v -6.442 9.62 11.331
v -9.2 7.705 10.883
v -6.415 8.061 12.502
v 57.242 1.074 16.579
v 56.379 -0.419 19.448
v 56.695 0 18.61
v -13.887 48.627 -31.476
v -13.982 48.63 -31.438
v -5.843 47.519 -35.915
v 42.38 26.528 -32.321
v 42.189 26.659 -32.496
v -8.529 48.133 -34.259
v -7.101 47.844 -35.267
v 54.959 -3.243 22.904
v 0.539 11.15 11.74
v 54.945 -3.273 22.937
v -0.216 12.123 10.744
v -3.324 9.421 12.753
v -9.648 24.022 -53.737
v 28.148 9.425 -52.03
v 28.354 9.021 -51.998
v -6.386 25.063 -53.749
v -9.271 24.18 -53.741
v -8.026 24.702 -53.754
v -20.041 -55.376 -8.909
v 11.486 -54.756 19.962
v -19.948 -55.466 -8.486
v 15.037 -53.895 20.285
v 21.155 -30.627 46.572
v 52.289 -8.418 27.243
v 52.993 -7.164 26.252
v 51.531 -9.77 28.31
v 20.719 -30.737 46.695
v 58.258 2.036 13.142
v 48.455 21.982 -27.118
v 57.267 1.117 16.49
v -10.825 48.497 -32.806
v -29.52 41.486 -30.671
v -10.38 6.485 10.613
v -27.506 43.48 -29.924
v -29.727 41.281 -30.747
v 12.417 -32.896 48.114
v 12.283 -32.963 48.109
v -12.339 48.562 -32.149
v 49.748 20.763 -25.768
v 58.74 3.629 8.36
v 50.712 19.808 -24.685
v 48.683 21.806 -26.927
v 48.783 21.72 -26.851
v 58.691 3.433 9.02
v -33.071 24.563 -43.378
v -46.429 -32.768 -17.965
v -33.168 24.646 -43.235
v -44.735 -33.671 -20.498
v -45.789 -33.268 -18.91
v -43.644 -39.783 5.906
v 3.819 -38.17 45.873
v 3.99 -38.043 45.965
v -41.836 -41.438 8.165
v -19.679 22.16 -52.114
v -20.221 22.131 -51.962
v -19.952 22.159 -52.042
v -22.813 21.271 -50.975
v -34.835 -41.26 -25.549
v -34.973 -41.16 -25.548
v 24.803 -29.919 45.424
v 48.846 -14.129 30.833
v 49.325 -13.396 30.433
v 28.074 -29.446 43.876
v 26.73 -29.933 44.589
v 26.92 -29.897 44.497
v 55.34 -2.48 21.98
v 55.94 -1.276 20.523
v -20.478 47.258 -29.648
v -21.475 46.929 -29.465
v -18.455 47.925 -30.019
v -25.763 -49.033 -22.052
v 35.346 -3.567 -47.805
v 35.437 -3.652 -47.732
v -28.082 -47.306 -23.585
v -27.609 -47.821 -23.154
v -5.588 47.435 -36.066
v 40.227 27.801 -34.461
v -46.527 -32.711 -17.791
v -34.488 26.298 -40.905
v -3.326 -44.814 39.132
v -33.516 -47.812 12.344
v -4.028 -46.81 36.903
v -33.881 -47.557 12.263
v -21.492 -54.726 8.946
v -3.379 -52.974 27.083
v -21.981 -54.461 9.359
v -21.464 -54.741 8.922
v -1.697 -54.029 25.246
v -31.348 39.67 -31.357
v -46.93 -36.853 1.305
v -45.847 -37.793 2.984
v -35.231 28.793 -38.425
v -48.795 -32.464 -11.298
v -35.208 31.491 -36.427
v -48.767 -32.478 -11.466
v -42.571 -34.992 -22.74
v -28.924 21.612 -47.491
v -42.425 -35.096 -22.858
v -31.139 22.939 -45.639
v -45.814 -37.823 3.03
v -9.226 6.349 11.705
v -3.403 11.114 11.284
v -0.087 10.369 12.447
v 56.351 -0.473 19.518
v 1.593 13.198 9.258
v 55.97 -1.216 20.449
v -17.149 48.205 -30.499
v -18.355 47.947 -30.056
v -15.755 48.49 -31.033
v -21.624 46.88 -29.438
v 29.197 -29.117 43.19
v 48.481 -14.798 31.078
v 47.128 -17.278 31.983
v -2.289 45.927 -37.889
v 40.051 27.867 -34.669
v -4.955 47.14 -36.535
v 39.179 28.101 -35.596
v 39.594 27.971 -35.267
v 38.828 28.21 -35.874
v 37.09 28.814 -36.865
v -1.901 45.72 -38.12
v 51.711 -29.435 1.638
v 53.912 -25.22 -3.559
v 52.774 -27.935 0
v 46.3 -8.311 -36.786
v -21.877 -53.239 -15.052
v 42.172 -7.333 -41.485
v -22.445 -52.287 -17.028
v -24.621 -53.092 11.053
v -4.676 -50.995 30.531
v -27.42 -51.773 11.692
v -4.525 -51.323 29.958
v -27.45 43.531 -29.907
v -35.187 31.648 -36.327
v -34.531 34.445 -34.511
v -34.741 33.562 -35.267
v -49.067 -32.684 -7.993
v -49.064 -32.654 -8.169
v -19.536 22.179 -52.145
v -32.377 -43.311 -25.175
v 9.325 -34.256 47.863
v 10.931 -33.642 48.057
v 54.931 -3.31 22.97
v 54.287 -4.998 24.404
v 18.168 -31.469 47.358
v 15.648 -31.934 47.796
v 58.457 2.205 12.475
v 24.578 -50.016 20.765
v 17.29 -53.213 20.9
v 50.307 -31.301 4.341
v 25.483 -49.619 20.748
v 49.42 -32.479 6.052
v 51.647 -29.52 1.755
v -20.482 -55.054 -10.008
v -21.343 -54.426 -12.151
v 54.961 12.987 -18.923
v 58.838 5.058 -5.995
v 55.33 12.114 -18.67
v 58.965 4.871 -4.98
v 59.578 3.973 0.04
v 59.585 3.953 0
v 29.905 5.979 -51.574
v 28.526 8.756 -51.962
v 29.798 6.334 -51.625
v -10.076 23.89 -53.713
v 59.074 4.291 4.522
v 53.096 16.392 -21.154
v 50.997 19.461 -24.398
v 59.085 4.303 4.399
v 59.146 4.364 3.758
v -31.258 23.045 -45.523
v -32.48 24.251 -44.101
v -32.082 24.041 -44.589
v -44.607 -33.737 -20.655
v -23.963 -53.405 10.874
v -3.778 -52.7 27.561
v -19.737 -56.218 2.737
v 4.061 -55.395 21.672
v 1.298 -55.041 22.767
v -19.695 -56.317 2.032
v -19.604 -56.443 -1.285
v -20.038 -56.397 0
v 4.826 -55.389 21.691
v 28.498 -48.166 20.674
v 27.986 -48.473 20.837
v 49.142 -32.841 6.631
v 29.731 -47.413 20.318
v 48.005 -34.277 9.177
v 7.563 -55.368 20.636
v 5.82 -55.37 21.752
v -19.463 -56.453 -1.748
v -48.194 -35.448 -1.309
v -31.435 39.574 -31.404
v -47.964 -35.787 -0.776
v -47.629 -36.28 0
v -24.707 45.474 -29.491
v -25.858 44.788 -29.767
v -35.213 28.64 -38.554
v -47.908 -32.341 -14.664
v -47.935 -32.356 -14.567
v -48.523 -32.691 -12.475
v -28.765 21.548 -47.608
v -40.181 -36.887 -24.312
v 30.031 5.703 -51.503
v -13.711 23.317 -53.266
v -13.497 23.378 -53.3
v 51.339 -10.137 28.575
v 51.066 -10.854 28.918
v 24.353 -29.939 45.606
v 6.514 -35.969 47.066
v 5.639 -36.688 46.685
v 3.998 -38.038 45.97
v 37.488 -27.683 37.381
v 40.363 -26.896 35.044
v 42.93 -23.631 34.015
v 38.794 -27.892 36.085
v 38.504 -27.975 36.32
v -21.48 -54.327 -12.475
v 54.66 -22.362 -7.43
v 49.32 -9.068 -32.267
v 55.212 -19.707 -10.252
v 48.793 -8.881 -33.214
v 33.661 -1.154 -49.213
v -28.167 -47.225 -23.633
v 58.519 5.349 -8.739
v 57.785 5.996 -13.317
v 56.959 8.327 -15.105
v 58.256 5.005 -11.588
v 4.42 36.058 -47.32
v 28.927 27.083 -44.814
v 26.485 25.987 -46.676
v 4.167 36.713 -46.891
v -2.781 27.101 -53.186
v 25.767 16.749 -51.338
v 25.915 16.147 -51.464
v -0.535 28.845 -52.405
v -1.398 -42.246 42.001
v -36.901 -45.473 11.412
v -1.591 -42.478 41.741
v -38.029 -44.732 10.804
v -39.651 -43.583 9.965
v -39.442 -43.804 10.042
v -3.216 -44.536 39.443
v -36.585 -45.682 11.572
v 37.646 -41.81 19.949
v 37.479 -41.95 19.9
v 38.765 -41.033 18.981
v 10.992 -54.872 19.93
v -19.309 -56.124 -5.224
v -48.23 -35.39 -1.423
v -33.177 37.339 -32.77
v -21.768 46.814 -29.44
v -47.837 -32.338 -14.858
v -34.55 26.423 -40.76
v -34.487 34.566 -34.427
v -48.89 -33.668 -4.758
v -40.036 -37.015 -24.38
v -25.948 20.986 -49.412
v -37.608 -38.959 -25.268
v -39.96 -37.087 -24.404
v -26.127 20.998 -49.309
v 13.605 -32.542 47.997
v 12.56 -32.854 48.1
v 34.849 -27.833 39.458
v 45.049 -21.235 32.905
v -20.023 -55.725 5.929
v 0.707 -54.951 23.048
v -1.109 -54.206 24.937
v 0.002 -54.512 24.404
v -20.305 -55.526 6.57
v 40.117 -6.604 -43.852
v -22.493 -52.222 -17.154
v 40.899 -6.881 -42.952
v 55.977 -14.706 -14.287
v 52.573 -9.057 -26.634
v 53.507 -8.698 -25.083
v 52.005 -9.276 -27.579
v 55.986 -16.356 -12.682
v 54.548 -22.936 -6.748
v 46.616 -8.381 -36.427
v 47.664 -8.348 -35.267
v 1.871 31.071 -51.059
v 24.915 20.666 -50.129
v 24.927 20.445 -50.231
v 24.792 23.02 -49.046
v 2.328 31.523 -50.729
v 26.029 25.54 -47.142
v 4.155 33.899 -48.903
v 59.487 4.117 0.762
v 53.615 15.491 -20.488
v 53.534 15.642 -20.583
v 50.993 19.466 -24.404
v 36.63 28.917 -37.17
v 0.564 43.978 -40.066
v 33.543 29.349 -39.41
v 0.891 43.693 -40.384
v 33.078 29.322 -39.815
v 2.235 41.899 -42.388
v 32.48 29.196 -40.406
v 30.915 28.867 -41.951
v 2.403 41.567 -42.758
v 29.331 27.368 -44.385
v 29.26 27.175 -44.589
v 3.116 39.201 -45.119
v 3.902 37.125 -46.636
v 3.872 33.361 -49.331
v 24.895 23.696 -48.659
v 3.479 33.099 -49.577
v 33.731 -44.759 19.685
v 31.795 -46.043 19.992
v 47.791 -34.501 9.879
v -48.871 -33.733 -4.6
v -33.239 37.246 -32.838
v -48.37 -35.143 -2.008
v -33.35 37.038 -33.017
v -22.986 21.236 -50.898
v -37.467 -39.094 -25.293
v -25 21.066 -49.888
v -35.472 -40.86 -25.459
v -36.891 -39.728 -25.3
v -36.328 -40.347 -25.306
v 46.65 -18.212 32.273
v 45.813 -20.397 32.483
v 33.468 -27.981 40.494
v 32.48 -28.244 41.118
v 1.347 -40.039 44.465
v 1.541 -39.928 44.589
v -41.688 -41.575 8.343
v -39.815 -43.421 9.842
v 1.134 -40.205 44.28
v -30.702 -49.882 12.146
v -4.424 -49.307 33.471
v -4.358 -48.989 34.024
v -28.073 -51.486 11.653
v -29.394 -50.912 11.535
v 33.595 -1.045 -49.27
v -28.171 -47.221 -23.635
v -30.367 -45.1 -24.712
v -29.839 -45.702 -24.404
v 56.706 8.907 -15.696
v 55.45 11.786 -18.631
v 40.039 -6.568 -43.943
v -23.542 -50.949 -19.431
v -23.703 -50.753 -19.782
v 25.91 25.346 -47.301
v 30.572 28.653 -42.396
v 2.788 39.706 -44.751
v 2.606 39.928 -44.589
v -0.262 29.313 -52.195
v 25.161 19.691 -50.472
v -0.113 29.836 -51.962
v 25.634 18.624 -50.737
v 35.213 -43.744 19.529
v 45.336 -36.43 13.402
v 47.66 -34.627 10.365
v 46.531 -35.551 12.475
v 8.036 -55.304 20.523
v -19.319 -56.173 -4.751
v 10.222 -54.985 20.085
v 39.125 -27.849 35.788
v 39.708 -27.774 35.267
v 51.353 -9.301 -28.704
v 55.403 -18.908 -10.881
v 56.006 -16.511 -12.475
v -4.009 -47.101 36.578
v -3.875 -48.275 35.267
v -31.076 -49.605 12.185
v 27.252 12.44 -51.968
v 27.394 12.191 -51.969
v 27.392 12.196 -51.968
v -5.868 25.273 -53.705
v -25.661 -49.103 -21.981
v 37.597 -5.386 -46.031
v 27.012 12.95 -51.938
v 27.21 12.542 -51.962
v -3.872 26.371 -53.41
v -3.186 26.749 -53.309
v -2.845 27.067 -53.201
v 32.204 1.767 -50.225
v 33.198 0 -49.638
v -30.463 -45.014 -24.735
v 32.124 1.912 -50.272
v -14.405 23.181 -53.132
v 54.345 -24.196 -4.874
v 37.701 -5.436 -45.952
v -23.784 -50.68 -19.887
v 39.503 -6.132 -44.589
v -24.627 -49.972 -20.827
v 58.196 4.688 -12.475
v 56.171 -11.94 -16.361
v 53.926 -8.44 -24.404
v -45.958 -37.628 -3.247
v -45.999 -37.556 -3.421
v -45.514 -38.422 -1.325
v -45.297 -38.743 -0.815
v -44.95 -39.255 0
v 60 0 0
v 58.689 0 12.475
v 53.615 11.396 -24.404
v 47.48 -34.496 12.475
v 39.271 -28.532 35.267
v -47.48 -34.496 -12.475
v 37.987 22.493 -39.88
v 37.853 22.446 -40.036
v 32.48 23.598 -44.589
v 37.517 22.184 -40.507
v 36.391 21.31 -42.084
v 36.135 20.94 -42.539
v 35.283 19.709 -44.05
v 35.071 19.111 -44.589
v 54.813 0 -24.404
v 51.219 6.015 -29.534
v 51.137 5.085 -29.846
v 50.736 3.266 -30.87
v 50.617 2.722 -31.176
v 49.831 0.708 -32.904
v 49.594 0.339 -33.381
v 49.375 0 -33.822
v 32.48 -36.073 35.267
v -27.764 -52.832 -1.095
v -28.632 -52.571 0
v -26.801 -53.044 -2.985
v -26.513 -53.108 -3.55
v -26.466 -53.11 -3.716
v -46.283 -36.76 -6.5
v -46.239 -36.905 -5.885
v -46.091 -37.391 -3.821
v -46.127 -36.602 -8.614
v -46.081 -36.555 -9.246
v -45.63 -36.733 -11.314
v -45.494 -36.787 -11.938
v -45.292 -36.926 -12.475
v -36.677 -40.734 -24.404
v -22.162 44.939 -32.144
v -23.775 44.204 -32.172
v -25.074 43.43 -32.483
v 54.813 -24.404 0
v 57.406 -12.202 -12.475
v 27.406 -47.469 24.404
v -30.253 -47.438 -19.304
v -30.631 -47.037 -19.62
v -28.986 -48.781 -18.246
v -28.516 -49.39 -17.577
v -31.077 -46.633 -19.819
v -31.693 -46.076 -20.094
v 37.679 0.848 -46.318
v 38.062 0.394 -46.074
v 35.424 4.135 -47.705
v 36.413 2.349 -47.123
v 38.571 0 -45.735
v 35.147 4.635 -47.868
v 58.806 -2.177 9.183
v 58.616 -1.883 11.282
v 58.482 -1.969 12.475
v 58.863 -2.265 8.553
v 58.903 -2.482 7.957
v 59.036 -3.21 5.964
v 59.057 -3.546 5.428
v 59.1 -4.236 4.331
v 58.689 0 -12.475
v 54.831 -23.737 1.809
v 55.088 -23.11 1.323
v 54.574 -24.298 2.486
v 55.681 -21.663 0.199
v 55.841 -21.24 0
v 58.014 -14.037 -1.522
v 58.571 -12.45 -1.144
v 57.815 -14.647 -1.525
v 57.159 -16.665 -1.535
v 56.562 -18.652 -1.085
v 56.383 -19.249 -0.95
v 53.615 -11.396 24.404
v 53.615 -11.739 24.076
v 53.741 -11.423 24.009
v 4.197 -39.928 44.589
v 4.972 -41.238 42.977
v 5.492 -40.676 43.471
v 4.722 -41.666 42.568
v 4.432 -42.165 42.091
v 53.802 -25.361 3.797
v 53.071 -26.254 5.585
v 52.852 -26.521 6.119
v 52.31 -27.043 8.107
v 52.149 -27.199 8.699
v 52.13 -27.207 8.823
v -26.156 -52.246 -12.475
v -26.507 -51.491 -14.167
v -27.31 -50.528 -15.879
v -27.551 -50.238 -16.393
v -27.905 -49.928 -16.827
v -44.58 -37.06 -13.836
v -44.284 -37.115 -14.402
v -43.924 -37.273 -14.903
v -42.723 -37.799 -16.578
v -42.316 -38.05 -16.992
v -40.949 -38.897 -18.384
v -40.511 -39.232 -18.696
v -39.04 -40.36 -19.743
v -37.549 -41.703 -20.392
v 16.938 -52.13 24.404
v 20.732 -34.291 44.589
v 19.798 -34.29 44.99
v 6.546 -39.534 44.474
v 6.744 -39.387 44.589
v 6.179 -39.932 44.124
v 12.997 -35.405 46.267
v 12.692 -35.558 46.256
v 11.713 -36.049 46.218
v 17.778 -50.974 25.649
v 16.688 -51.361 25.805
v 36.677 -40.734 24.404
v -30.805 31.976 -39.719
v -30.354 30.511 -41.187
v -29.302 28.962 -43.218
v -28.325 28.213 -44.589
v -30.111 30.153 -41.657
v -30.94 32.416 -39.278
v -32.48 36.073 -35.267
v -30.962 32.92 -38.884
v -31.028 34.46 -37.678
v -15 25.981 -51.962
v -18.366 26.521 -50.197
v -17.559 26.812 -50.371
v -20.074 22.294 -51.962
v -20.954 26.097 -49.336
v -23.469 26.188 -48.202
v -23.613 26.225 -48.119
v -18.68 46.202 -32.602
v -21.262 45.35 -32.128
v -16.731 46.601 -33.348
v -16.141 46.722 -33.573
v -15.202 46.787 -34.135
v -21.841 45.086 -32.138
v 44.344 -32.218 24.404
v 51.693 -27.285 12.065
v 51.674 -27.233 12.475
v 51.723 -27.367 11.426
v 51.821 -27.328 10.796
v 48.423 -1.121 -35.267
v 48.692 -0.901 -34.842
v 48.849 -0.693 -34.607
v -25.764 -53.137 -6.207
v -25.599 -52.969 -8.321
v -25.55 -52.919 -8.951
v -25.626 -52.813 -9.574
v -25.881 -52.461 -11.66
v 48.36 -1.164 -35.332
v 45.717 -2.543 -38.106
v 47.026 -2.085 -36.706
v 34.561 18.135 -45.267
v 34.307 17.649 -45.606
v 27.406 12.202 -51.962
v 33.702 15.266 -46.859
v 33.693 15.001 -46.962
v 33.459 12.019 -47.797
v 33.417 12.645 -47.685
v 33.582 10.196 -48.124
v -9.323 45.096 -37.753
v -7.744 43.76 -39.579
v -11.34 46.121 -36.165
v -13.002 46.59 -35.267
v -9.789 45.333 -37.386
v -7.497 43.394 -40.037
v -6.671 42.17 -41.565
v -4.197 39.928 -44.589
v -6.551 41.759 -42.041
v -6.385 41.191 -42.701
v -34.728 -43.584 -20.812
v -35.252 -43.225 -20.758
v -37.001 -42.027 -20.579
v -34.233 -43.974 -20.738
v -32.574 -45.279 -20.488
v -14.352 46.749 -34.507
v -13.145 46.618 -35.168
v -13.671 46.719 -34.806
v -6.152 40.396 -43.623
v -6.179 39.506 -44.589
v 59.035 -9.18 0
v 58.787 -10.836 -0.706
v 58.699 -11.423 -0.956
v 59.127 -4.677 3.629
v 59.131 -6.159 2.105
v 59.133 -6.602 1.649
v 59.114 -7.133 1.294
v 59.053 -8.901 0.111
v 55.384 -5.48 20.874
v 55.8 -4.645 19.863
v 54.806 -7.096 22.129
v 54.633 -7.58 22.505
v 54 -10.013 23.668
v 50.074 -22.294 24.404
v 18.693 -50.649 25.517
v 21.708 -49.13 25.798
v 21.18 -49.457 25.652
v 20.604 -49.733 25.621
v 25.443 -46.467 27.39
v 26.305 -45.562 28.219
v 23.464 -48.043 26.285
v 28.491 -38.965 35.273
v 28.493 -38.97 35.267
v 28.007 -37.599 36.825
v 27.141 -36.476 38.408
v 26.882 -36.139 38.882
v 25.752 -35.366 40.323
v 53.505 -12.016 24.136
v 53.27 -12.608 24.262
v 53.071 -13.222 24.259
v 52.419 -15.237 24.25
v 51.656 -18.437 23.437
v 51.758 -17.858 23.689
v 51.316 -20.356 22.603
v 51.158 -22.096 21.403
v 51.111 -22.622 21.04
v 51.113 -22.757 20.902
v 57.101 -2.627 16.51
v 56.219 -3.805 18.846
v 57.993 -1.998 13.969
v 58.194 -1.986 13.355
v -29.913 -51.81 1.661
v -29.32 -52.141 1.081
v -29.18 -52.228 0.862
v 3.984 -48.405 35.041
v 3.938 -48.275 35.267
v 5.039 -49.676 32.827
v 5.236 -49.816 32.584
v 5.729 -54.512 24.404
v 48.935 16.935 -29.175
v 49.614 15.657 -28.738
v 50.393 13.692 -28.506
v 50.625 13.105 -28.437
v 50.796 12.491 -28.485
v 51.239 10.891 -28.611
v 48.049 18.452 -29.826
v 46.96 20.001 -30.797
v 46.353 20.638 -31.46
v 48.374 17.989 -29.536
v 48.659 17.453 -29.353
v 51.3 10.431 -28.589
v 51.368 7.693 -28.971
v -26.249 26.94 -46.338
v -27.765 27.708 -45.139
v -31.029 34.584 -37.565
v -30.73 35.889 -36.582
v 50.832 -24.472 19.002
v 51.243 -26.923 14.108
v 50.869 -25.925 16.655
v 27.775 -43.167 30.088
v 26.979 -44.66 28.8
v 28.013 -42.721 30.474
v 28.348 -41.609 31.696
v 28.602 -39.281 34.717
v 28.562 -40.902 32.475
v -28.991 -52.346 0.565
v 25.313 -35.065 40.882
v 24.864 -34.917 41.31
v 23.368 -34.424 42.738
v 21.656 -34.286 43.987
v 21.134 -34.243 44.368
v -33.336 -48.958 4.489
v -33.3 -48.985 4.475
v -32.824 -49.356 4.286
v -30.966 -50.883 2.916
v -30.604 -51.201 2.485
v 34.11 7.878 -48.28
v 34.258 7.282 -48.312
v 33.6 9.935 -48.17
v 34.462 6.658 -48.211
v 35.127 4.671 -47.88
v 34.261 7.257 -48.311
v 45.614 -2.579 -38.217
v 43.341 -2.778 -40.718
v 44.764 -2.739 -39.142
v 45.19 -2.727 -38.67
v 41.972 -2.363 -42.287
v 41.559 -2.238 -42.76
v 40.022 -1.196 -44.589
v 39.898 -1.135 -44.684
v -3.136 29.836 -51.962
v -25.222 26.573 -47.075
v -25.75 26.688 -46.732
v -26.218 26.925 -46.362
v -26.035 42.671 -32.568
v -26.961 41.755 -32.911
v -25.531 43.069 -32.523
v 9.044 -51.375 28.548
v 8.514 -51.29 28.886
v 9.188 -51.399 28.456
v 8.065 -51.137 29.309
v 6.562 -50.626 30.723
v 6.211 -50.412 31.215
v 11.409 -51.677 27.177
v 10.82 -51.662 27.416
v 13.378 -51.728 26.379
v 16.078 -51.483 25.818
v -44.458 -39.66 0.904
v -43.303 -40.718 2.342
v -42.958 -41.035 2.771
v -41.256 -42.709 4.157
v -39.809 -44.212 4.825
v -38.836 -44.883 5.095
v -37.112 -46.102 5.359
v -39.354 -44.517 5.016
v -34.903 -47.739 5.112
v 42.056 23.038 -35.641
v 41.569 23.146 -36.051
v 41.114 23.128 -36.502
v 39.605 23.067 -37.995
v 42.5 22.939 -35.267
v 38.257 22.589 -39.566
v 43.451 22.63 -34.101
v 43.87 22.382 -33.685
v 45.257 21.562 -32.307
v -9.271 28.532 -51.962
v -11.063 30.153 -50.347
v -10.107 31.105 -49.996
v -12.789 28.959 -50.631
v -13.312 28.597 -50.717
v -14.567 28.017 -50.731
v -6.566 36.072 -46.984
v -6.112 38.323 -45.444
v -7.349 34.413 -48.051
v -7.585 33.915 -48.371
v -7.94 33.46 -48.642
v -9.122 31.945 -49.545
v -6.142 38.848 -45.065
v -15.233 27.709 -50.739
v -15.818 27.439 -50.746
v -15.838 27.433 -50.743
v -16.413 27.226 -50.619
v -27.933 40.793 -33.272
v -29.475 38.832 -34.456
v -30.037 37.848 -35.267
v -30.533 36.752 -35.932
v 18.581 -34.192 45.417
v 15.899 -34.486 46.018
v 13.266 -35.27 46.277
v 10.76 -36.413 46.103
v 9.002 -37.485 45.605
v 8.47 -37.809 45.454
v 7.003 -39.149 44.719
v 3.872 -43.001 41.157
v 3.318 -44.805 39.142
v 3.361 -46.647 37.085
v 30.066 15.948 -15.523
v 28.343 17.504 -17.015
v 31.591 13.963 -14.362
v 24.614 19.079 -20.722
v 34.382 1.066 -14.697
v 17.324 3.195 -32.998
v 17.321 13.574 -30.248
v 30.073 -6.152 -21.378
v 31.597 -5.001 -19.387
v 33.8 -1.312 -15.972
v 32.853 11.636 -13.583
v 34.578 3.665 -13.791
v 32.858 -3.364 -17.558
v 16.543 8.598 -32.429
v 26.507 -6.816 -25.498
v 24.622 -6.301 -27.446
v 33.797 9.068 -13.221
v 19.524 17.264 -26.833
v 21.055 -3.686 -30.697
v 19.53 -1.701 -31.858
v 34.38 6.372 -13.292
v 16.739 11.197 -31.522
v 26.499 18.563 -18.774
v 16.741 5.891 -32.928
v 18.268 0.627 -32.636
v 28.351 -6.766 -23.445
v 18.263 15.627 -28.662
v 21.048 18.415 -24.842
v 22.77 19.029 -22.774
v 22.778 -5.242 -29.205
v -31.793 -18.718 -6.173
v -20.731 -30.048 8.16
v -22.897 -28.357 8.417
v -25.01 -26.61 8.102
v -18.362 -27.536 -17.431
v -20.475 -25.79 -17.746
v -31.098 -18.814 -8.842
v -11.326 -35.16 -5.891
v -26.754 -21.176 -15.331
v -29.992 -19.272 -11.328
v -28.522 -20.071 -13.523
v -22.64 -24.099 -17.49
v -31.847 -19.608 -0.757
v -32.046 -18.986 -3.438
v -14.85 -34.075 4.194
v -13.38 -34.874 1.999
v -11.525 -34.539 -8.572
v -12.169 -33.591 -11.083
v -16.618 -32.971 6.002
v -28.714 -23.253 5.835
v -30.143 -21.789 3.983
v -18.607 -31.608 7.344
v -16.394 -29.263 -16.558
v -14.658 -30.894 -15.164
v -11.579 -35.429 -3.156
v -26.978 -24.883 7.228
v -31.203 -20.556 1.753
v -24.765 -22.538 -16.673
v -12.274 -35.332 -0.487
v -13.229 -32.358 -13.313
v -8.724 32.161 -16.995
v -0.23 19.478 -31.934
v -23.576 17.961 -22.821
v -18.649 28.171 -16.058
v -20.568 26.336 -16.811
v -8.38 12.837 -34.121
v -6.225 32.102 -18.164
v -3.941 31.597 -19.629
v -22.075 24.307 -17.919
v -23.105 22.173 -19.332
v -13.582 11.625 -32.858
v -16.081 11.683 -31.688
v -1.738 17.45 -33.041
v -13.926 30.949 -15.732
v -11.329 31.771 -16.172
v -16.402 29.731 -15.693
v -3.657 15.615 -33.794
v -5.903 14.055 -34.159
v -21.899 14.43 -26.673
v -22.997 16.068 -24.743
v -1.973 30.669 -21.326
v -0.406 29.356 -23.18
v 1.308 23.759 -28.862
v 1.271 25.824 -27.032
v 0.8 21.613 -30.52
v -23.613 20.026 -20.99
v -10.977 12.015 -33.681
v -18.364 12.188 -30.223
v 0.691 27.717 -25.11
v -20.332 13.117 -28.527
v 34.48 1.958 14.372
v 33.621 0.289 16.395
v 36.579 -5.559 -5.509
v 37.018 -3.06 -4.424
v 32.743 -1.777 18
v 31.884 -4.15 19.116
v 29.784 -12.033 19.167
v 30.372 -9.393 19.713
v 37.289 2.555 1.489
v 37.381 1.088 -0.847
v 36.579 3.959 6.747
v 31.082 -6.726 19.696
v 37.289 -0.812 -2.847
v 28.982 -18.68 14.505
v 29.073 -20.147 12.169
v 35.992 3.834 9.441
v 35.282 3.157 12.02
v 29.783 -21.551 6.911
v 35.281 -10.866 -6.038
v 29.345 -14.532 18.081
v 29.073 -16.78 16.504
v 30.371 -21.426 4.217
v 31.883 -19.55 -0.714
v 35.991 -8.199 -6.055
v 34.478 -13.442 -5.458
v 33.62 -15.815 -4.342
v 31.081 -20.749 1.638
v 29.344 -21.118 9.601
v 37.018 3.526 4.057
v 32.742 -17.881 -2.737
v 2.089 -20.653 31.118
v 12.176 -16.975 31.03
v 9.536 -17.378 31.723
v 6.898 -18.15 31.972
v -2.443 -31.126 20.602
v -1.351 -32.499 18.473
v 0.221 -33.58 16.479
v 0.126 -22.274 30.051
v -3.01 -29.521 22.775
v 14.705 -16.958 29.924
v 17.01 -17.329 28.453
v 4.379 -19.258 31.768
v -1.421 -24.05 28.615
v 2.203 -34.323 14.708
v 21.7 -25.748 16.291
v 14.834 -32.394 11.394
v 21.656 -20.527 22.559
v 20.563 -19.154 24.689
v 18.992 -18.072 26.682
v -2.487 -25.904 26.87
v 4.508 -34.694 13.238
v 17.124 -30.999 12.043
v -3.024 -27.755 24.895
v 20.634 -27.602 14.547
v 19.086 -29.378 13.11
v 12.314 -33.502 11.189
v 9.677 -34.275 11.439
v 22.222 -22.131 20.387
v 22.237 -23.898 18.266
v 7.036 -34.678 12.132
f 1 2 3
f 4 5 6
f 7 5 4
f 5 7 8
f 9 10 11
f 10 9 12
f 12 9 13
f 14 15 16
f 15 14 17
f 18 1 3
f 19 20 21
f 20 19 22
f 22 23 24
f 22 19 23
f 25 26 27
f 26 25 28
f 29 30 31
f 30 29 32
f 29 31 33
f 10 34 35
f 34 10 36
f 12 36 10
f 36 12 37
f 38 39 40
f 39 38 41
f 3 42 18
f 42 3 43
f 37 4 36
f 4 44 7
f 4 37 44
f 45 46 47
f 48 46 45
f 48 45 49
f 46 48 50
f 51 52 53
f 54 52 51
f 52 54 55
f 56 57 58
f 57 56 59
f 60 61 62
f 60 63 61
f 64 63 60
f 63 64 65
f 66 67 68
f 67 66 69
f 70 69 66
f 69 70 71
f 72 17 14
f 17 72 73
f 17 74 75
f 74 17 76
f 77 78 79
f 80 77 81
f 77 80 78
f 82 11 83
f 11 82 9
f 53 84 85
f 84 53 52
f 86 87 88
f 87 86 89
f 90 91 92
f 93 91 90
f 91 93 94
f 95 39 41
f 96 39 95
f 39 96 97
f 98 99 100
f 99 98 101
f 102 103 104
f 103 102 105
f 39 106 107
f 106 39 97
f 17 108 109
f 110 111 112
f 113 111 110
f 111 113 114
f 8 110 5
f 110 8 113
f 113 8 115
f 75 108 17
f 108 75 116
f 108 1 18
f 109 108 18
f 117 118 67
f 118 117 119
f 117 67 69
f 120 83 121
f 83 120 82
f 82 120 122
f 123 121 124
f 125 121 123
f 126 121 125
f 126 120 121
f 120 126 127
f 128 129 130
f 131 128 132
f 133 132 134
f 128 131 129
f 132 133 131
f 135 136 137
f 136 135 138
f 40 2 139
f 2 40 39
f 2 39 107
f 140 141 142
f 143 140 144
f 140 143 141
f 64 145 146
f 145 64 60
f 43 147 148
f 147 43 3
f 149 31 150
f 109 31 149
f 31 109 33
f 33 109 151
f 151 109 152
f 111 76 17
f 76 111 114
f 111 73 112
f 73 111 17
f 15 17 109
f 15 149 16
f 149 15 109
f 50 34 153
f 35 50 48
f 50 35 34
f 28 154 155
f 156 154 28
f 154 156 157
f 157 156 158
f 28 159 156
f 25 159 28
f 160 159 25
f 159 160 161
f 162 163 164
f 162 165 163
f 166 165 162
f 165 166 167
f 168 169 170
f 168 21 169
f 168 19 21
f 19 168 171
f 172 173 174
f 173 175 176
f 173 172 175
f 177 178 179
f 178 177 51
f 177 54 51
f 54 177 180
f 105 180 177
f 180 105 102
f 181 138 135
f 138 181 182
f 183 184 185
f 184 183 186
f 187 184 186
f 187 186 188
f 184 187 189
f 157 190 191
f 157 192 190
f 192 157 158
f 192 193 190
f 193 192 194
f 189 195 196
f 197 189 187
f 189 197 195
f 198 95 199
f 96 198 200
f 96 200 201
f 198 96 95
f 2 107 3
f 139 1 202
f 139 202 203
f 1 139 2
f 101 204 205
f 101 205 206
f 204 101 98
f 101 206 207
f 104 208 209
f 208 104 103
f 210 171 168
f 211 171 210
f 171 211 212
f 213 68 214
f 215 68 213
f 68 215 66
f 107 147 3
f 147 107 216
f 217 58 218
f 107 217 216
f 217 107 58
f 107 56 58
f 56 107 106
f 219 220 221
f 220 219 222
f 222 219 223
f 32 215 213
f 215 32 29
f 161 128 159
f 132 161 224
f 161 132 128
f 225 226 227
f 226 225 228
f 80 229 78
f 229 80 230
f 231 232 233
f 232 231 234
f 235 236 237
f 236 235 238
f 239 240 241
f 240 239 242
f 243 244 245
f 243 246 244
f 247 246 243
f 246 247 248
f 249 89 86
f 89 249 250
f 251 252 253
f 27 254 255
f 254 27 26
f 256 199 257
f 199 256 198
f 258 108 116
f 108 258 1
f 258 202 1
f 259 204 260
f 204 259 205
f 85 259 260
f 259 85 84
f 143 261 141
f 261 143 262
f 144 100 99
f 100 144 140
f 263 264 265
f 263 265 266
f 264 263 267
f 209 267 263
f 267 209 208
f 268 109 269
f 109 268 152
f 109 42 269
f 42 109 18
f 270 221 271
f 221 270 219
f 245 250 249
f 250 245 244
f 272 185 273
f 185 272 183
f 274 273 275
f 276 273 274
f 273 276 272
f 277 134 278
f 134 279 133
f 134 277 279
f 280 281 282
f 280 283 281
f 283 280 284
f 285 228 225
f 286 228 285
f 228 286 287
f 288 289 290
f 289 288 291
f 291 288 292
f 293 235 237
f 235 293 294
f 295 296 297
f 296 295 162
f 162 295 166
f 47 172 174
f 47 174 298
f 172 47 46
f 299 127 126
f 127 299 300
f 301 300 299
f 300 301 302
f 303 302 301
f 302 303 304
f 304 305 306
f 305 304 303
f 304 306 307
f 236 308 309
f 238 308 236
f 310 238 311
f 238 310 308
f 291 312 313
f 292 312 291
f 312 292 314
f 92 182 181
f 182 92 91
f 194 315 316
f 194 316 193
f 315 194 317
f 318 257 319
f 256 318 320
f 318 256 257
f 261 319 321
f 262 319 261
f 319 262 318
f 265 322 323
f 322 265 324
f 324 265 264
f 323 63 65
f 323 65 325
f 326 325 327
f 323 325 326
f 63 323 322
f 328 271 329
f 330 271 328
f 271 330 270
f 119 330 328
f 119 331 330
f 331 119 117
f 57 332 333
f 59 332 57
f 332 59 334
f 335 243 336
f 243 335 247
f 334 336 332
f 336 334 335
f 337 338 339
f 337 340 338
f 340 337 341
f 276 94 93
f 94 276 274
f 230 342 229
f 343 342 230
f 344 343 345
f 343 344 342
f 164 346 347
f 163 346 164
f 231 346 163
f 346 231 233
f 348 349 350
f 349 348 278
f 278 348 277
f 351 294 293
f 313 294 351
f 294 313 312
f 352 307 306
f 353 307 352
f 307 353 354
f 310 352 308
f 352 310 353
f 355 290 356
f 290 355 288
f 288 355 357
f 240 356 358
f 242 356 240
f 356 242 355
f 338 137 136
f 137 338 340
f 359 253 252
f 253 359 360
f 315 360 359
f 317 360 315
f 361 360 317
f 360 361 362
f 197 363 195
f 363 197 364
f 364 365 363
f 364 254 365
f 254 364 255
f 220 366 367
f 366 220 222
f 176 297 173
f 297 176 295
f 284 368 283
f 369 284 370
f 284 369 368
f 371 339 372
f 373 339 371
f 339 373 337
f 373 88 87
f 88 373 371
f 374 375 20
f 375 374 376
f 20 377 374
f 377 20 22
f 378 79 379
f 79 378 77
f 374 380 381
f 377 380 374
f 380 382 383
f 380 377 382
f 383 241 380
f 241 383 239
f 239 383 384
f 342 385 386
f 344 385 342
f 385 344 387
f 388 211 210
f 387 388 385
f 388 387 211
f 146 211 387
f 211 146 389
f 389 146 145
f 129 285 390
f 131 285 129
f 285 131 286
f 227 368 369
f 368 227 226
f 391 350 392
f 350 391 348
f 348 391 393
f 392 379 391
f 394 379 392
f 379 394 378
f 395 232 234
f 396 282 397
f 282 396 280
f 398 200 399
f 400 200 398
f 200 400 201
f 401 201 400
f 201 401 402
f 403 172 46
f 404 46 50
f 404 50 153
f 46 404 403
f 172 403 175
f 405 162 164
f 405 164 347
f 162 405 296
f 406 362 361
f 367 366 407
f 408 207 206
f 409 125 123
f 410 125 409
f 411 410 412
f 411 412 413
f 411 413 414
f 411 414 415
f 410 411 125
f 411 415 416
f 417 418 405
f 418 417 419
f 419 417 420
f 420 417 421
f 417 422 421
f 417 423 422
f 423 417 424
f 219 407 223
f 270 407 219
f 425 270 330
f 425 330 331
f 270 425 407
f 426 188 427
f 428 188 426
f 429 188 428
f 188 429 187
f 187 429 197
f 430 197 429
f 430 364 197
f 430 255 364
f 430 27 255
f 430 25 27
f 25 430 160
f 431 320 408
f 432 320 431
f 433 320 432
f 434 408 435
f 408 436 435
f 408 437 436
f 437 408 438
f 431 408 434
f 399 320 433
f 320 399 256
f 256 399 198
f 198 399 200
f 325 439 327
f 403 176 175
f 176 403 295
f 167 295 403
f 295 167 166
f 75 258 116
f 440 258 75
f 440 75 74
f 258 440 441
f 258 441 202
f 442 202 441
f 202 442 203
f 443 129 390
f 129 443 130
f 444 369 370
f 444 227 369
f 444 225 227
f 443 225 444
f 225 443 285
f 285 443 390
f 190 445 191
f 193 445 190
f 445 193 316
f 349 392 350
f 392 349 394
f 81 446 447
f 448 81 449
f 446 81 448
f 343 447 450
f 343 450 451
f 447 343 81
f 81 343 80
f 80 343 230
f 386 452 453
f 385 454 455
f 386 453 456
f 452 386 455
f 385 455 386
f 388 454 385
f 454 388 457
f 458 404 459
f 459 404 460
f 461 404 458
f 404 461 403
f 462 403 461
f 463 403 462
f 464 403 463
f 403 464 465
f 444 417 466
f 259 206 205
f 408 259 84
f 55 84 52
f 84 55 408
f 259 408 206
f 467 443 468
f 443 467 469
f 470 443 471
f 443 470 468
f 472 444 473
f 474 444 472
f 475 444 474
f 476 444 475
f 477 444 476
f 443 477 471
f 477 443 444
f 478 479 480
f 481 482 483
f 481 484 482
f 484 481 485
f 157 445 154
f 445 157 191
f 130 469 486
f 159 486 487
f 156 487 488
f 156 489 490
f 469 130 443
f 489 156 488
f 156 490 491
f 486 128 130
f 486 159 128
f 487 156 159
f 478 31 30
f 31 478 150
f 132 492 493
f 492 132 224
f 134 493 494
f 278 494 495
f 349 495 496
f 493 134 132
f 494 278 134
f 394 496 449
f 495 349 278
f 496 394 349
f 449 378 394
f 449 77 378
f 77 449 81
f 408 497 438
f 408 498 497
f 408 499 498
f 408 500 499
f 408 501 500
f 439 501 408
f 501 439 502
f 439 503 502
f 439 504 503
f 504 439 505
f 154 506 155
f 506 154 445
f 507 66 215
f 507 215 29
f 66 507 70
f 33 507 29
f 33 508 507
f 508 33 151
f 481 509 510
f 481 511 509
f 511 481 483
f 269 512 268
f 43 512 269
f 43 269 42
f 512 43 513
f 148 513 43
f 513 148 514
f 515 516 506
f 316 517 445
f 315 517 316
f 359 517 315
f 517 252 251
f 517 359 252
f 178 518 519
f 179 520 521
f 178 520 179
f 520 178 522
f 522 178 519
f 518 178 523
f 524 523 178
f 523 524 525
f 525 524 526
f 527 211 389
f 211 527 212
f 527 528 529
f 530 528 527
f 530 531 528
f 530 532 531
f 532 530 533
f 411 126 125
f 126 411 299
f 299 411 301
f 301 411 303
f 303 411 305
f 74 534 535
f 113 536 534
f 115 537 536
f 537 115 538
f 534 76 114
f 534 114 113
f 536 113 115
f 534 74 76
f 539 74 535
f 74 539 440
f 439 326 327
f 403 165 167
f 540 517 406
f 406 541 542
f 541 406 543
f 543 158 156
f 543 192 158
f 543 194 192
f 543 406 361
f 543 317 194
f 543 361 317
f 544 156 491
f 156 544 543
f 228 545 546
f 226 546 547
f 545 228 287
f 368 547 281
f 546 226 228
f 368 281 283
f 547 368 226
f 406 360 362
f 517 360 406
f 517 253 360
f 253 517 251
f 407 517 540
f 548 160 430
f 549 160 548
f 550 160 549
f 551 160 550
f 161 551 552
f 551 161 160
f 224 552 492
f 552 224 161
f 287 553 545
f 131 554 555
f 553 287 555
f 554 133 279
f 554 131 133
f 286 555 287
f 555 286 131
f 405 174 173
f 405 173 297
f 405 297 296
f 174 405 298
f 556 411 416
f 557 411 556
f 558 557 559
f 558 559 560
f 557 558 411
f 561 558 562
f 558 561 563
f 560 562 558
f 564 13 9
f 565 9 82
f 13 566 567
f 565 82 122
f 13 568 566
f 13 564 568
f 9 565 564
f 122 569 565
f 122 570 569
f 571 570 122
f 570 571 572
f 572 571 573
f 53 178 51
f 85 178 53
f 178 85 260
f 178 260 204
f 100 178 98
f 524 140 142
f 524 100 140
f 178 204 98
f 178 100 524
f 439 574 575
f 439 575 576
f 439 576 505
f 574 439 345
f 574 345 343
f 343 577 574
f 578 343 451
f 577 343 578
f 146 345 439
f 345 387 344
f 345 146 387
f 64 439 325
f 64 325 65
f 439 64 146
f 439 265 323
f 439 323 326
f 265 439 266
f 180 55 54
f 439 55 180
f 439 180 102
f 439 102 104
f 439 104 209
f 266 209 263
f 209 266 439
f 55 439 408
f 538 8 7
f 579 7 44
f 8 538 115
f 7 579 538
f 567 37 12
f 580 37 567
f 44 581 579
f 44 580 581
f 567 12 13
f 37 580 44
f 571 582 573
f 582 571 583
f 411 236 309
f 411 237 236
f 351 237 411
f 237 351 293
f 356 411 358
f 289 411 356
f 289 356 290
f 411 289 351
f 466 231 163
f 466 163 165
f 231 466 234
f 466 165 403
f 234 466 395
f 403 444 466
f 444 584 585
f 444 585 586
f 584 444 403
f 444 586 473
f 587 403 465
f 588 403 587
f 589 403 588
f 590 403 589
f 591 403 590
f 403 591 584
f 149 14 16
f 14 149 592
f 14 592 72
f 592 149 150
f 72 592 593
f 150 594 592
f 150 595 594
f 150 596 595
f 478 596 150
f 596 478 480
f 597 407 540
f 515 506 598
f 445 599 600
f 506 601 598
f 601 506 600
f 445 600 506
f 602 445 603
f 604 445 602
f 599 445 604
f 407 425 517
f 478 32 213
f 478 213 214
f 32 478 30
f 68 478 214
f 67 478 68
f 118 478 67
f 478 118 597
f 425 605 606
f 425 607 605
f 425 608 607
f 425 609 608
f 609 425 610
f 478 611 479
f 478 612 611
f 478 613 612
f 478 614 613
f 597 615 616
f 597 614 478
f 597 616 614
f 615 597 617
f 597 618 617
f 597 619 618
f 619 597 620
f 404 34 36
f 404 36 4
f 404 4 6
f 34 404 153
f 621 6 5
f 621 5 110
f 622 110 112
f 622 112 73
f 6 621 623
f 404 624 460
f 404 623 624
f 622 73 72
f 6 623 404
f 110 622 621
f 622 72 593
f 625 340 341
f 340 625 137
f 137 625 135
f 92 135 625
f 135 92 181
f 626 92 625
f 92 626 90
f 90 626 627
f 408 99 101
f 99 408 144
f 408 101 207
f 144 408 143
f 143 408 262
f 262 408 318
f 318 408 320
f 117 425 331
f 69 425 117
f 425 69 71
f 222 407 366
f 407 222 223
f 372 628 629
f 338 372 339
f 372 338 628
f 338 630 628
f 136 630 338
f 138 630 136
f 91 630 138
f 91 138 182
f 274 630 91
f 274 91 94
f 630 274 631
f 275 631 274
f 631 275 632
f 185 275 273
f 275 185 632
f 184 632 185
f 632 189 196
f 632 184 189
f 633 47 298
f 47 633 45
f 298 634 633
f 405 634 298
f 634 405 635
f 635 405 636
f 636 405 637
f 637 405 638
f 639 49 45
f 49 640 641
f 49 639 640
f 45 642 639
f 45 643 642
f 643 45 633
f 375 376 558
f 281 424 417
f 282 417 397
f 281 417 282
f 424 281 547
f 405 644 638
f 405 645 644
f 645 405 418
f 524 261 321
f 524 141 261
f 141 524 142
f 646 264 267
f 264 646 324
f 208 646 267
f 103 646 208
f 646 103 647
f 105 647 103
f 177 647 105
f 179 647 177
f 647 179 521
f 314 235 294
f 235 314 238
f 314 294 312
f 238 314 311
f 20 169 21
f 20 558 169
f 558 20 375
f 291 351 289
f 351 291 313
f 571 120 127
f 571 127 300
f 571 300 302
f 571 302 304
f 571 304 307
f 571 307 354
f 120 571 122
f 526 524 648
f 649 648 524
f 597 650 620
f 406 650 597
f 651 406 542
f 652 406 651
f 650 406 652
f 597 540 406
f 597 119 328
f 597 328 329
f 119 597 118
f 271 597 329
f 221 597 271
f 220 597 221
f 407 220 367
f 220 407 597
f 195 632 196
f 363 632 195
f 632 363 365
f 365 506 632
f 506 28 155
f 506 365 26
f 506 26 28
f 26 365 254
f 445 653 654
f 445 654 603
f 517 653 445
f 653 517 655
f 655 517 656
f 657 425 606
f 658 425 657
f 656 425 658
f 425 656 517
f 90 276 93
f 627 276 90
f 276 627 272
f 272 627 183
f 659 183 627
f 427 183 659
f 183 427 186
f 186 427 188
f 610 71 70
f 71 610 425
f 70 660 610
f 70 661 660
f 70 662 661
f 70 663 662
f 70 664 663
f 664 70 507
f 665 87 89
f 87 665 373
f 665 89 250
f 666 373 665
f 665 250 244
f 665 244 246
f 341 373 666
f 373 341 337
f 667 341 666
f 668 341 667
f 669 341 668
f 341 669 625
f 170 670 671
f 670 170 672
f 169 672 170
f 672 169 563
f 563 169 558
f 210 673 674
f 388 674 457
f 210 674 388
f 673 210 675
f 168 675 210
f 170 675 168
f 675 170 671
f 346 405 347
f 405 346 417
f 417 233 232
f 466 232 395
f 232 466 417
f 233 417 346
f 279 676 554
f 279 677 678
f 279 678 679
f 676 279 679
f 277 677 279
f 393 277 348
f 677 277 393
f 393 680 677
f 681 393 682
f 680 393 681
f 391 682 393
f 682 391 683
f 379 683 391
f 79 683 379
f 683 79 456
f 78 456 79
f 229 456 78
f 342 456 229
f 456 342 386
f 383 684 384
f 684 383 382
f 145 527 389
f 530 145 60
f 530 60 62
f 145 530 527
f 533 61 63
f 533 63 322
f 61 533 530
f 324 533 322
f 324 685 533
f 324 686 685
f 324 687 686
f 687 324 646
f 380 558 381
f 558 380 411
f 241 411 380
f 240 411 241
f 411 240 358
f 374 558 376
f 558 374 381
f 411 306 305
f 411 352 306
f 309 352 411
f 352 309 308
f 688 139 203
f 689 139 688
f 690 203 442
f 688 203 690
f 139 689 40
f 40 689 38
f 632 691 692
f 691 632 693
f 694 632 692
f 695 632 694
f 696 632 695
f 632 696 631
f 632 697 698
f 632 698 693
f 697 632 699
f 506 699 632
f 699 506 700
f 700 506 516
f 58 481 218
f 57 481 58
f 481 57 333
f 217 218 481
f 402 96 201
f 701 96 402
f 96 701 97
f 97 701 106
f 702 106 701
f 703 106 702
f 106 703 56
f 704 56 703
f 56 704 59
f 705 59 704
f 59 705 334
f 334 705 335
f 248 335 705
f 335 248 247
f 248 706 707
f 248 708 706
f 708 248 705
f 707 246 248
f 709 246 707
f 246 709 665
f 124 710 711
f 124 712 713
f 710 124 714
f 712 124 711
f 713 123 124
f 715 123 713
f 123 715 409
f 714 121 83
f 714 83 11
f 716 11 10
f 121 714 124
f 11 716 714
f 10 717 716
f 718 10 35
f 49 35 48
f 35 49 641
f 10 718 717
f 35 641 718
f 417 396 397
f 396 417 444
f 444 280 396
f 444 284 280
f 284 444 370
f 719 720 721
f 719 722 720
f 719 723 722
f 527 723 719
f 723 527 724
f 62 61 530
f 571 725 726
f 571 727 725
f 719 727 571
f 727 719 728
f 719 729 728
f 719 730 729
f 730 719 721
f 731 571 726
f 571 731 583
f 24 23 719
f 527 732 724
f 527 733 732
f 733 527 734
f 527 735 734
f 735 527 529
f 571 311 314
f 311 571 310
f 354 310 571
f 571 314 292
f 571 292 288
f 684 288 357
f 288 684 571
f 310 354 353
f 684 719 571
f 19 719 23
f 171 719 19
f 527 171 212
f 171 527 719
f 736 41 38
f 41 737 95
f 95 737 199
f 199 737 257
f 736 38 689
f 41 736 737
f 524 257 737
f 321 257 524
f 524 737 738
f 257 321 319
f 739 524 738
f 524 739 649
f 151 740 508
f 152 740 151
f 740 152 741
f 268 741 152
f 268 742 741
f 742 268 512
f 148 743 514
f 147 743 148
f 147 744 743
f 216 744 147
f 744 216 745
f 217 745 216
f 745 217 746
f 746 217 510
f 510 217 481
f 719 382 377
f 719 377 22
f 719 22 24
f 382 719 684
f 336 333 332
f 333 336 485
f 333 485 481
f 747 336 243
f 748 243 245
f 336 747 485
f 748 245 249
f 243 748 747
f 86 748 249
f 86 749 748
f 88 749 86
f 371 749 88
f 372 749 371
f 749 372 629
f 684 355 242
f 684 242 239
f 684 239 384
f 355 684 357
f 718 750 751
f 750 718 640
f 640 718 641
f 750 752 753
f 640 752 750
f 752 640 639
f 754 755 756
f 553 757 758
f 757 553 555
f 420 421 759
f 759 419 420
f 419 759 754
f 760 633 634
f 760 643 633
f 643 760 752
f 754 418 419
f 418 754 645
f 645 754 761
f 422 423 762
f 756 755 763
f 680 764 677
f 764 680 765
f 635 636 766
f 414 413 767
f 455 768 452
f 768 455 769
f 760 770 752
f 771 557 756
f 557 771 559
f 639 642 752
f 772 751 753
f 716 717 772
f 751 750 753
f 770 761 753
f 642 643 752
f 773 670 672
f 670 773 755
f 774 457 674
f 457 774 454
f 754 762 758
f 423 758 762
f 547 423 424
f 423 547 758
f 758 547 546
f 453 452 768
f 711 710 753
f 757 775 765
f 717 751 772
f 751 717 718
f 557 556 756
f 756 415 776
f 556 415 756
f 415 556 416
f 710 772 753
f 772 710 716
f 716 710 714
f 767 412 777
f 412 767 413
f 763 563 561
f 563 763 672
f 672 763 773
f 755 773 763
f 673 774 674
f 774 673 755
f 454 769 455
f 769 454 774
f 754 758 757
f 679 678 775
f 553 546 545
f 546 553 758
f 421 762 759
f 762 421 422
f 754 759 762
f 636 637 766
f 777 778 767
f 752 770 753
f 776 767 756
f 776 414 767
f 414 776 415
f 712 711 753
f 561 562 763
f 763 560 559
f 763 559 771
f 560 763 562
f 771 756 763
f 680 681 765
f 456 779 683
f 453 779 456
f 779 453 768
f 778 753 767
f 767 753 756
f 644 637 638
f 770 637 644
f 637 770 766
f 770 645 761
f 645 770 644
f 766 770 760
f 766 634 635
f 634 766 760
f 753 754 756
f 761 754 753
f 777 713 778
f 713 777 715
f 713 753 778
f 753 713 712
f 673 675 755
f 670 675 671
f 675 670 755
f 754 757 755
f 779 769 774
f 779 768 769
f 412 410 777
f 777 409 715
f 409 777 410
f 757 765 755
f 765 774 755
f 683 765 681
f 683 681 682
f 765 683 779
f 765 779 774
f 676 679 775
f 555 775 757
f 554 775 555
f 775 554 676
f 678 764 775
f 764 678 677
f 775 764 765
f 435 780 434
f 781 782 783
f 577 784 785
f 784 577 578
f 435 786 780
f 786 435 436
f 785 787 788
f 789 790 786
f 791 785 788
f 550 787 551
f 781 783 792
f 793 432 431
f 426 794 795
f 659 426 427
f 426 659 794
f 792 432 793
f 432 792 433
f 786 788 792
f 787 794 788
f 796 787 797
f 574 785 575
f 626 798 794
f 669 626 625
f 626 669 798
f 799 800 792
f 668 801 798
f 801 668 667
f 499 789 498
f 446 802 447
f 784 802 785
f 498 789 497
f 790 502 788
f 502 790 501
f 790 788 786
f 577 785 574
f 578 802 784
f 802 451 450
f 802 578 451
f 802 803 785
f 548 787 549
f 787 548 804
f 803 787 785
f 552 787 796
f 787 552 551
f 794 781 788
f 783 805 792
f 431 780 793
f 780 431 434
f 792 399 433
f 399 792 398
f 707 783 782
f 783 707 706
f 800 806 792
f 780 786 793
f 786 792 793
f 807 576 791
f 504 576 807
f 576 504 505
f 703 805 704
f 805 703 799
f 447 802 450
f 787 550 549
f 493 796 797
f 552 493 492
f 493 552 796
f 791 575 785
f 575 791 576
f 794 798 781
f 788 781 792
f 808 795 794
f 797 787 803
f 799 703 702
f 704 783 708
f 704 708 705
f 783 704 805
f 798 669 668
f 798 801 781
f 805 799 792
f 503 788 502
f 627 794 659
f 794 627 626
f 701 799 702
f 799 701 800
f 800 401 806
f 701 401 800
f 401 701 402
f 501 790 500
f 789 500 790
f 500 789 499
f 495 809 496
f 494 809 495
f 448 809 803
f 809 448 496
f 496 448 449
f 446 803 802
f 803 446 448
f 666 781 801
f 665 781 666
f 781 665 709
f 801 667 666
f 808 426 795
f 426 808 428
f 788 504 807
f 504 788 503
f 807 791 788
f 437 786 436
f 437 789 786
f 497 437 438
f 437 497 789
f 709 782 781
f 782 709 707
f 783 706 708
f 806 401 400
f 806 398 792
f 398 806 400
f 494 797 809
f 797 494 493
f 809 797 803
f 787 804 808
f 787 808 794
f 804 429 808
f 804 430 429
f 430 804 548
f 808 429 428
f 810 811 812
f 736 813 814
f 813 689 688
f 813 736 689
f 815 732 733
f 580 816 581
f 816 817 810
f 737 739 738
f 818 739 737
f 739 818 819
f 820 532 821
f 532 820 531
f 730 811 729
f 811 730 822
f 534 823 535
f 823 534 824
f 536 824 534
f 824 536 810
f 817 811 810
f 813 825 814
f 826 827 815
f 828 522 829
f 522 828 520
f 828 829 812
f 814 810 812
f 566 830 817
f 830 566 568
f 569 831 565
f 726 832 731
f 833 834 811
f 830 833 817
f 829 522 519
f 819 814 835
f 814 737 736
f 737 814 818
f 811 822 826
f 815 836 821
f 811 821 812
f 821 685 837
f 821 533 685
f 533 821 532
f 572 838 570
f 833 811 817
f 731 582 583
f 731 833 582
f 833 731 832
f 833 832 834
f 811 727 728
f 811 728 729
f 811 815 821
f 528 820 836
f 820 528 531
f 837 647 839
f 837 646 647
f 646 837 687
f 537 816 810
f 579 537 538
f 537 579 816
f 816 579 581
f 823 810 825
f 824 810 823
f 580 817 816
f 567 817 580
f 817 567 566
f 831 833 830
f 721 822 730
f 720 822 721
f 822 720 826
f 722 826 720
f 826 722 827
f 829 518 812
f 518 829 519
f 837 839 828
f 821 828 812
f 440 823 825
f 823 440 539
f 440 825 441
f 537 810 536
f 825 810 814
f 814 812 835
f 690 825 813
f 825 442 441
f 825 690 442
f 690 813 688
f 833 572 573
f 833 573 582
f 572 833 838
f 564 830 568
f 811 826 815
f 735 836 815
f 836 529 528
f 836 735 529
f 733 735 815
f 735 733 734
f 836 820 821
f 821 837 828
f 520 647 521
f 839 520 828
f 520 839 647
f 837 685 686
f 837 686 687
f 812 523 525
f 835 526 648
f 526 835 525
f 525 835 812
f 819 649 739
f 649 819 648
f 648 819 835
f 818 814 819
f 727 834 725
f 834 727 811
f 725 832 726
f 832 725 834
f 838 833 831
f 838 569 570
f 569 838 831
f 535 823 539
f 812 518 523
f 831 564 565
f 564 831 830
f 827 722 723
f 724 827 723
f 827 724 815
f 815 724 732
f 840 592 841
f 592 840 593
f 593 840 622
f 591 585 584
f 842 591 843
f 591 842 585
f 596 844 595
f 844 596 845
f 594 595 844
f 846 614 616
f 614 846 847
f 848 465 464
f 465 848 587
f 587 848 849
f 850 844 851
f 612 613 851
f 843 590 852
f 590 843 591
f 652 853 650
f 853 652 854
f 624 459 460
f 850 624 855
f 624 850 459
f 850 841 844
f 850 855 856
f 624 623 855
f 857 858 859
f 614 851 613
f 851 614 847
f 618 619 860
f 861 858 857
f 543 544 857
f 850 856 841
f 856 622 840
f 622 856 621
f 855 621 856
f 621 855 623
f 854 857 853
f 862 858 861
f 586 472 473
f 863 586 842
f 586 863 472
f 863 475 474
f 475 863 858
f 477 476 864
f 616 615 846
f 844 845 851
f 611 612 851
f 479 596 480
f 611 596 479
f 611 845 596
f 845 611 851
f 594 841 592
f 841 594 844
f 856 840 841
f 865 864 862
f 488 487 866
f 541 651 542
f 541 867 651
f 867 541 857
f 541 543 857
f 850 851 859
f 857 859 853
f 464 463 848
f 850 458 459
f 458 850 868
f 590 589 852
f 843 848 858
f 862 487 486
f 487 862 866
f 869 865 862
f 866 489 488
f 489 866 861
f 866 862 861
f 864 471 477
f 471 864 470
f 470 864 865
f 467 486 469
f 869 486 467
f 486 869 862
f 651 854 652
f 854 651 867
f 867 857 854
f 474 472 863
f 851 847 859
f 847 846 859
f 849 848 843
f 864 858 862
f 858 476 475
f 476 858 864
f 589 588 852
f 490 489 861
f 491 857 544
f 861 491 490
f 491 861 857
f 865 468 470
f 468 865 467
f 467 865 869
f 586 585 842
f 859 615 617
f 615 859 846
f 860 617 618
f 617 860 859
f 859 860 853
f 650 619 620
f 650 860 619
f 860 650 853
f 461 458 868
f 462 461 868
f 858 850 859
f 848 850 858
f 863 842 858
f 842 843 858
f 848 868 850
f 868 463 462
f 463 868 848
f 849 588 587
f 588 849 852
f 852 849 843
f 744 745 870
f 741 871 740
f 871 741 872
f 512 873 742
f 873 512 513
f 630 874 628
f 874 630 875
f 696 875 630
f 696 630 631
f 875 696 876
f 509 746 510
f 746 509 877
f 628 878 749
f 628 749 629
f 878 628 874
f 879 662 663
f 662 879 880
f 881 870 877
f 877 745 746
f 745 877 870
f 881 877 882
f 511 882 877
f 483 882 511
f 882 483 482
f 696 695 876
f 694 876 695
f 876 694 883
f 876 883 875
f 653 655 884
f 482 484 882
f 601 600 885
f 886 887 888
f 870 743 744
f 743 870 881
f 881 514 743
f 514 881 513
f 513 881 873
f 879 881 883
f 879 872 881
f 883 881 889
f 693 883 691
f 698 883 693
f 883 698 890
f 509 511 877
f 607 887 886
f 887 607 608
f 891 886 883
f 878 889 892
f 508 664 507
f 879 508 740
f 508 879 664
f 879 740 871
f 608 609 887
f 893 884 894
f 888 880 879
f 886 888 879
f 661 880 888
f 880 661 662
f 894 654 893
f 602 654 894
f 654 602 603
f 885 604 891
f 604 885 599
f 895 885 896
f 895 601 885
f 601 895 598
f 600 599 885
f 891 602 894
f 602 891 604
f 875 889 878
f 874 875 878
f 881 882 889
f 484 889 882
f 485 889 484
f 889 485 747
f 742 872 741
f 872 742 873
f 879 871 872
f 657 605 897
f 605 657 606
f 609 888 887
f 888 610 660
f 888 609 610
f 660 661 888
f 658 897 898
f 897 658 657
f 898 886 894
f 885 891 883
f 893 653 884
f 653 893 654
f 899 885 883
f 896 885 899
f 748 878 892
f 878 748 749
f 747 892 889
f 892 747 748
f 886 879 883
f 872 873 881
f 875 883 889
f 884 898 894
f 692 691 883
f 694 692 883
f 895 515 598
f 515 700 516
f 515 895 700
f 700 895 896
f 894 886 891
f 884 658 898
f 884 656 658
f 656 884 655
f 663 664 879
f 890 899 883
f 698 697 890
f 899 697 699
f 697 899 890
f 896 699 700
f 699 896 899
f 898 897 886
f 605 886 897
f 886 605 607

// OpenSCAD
difference() {
	intersection() {
		hull() {
			rotate(a = -121.8002487075, v = [0.5847885275, 0.6167139367, -0.0000000000]) {
				rotate(a = -90.0000000000, v = [0.9914448614, 0.1305261922, -0.0000000000]) {
					cylinder(h = 60, r = 16.2000000000);
				}
			}
			rotate(a = -121.8002487075, v = [0.5847885275, 0.6167139367, -0.0000000000]) {
				rotate(a = -90.0000000000, v = [-0.6087614290, 0.7933533403, 0.0000000000]) {
					cylinder(h = 60, r = 16.2000000000);
				}
			}
			rotate(a = -121.8002487075, v = [0.5847885275, 0.6167139367, -0.0000000000]) {
				rotate(a = -20.3482733305, v = [0.3468424841, 0.0247683702, -0.0000000000]) {
					cylinder(h = 60, r = 16.2000000000);
				}
			}
			rotate(a = -121.8002487075, v = [0.5847885275, 0.6167139367, -0.0000000000]) {
				rotate(a = -146.5585275075, v = [0.5390549824, -0.1145175815, 0.0000000000]) {
					cylinder(h = 60, r = 16.2000000000);
				}
			}
			rotate(a = -121.8002487075, v = [0.5847885275, 0.6167139367, -0.0000000000]) {
				rotate(a = -157.7736717199, v = [-0.3557637402, 0.1285203412, 0.0000000000]) {
					cylinder(h = 60, r = 16.2000000000);
				}
			}
		}
		sphere(r = 60);
	}
	union() {
		rotate(a = -121.8002487075, v = [0.5847885275, 0.6167139367, -0.0000000000]) {
			rotate(a = -90.0000000000, v = [0.9914448614, 0.1305261922, -0.0000000000]) {
				translate(v = [0, 0, 35]) {
					cylinder(h = 100, r = 13.2000000000);
				}
			}
		}
		rotate(a = -121.8002487075, v = [0.5847885275, 0.6167139367, -0.0000000000]) {
			rotate(a = -90.0000000000, v = [-0.6087614290, 0.7933533403, 0.0000000000]) {
				translate(v = [0, 0, 35]) {
					cylinder(h = 100, r = 13.2000000000);
				}
			}
		}
		rotate(a = -121.8002487075, v = [0.5847885275, 0.6167139367, -0.0000000000]) {
			rotate(a = -20.3482733305, v = [0.3468424841, 0.0247683702, -0.0000000000]) {
				translate(v = [0, 0, 35]) {
					cylinder(h = 100, r = 13.2000000000);
				}
			}
		}
		rotate(a = -121.8002487075, v = [0.5847885275, 0.6167139367, -0.0000000000]) {
			rotate(a = -146.5585275075, v = [0.5390549824, -0.1145175815, 0.0000000000]) {
				translate(v = [0, 0, 35]) {
					cylinder(h = 100, r = 13.2000000000);
				}
			}
		}
		rotate(a = -121.8002487075, v = [0.5847885275, 0.6167139367, -0.0000000000]) {
			rotate(a = -157.7736717199, v = [-0.3557637402, 0.1285203412, 0.0000000000]) {
				translate(v = [0, 0, 35]) {
					cylinder(h = 100, r = 13.2000000000);
				}
			}
		}
	}
}
